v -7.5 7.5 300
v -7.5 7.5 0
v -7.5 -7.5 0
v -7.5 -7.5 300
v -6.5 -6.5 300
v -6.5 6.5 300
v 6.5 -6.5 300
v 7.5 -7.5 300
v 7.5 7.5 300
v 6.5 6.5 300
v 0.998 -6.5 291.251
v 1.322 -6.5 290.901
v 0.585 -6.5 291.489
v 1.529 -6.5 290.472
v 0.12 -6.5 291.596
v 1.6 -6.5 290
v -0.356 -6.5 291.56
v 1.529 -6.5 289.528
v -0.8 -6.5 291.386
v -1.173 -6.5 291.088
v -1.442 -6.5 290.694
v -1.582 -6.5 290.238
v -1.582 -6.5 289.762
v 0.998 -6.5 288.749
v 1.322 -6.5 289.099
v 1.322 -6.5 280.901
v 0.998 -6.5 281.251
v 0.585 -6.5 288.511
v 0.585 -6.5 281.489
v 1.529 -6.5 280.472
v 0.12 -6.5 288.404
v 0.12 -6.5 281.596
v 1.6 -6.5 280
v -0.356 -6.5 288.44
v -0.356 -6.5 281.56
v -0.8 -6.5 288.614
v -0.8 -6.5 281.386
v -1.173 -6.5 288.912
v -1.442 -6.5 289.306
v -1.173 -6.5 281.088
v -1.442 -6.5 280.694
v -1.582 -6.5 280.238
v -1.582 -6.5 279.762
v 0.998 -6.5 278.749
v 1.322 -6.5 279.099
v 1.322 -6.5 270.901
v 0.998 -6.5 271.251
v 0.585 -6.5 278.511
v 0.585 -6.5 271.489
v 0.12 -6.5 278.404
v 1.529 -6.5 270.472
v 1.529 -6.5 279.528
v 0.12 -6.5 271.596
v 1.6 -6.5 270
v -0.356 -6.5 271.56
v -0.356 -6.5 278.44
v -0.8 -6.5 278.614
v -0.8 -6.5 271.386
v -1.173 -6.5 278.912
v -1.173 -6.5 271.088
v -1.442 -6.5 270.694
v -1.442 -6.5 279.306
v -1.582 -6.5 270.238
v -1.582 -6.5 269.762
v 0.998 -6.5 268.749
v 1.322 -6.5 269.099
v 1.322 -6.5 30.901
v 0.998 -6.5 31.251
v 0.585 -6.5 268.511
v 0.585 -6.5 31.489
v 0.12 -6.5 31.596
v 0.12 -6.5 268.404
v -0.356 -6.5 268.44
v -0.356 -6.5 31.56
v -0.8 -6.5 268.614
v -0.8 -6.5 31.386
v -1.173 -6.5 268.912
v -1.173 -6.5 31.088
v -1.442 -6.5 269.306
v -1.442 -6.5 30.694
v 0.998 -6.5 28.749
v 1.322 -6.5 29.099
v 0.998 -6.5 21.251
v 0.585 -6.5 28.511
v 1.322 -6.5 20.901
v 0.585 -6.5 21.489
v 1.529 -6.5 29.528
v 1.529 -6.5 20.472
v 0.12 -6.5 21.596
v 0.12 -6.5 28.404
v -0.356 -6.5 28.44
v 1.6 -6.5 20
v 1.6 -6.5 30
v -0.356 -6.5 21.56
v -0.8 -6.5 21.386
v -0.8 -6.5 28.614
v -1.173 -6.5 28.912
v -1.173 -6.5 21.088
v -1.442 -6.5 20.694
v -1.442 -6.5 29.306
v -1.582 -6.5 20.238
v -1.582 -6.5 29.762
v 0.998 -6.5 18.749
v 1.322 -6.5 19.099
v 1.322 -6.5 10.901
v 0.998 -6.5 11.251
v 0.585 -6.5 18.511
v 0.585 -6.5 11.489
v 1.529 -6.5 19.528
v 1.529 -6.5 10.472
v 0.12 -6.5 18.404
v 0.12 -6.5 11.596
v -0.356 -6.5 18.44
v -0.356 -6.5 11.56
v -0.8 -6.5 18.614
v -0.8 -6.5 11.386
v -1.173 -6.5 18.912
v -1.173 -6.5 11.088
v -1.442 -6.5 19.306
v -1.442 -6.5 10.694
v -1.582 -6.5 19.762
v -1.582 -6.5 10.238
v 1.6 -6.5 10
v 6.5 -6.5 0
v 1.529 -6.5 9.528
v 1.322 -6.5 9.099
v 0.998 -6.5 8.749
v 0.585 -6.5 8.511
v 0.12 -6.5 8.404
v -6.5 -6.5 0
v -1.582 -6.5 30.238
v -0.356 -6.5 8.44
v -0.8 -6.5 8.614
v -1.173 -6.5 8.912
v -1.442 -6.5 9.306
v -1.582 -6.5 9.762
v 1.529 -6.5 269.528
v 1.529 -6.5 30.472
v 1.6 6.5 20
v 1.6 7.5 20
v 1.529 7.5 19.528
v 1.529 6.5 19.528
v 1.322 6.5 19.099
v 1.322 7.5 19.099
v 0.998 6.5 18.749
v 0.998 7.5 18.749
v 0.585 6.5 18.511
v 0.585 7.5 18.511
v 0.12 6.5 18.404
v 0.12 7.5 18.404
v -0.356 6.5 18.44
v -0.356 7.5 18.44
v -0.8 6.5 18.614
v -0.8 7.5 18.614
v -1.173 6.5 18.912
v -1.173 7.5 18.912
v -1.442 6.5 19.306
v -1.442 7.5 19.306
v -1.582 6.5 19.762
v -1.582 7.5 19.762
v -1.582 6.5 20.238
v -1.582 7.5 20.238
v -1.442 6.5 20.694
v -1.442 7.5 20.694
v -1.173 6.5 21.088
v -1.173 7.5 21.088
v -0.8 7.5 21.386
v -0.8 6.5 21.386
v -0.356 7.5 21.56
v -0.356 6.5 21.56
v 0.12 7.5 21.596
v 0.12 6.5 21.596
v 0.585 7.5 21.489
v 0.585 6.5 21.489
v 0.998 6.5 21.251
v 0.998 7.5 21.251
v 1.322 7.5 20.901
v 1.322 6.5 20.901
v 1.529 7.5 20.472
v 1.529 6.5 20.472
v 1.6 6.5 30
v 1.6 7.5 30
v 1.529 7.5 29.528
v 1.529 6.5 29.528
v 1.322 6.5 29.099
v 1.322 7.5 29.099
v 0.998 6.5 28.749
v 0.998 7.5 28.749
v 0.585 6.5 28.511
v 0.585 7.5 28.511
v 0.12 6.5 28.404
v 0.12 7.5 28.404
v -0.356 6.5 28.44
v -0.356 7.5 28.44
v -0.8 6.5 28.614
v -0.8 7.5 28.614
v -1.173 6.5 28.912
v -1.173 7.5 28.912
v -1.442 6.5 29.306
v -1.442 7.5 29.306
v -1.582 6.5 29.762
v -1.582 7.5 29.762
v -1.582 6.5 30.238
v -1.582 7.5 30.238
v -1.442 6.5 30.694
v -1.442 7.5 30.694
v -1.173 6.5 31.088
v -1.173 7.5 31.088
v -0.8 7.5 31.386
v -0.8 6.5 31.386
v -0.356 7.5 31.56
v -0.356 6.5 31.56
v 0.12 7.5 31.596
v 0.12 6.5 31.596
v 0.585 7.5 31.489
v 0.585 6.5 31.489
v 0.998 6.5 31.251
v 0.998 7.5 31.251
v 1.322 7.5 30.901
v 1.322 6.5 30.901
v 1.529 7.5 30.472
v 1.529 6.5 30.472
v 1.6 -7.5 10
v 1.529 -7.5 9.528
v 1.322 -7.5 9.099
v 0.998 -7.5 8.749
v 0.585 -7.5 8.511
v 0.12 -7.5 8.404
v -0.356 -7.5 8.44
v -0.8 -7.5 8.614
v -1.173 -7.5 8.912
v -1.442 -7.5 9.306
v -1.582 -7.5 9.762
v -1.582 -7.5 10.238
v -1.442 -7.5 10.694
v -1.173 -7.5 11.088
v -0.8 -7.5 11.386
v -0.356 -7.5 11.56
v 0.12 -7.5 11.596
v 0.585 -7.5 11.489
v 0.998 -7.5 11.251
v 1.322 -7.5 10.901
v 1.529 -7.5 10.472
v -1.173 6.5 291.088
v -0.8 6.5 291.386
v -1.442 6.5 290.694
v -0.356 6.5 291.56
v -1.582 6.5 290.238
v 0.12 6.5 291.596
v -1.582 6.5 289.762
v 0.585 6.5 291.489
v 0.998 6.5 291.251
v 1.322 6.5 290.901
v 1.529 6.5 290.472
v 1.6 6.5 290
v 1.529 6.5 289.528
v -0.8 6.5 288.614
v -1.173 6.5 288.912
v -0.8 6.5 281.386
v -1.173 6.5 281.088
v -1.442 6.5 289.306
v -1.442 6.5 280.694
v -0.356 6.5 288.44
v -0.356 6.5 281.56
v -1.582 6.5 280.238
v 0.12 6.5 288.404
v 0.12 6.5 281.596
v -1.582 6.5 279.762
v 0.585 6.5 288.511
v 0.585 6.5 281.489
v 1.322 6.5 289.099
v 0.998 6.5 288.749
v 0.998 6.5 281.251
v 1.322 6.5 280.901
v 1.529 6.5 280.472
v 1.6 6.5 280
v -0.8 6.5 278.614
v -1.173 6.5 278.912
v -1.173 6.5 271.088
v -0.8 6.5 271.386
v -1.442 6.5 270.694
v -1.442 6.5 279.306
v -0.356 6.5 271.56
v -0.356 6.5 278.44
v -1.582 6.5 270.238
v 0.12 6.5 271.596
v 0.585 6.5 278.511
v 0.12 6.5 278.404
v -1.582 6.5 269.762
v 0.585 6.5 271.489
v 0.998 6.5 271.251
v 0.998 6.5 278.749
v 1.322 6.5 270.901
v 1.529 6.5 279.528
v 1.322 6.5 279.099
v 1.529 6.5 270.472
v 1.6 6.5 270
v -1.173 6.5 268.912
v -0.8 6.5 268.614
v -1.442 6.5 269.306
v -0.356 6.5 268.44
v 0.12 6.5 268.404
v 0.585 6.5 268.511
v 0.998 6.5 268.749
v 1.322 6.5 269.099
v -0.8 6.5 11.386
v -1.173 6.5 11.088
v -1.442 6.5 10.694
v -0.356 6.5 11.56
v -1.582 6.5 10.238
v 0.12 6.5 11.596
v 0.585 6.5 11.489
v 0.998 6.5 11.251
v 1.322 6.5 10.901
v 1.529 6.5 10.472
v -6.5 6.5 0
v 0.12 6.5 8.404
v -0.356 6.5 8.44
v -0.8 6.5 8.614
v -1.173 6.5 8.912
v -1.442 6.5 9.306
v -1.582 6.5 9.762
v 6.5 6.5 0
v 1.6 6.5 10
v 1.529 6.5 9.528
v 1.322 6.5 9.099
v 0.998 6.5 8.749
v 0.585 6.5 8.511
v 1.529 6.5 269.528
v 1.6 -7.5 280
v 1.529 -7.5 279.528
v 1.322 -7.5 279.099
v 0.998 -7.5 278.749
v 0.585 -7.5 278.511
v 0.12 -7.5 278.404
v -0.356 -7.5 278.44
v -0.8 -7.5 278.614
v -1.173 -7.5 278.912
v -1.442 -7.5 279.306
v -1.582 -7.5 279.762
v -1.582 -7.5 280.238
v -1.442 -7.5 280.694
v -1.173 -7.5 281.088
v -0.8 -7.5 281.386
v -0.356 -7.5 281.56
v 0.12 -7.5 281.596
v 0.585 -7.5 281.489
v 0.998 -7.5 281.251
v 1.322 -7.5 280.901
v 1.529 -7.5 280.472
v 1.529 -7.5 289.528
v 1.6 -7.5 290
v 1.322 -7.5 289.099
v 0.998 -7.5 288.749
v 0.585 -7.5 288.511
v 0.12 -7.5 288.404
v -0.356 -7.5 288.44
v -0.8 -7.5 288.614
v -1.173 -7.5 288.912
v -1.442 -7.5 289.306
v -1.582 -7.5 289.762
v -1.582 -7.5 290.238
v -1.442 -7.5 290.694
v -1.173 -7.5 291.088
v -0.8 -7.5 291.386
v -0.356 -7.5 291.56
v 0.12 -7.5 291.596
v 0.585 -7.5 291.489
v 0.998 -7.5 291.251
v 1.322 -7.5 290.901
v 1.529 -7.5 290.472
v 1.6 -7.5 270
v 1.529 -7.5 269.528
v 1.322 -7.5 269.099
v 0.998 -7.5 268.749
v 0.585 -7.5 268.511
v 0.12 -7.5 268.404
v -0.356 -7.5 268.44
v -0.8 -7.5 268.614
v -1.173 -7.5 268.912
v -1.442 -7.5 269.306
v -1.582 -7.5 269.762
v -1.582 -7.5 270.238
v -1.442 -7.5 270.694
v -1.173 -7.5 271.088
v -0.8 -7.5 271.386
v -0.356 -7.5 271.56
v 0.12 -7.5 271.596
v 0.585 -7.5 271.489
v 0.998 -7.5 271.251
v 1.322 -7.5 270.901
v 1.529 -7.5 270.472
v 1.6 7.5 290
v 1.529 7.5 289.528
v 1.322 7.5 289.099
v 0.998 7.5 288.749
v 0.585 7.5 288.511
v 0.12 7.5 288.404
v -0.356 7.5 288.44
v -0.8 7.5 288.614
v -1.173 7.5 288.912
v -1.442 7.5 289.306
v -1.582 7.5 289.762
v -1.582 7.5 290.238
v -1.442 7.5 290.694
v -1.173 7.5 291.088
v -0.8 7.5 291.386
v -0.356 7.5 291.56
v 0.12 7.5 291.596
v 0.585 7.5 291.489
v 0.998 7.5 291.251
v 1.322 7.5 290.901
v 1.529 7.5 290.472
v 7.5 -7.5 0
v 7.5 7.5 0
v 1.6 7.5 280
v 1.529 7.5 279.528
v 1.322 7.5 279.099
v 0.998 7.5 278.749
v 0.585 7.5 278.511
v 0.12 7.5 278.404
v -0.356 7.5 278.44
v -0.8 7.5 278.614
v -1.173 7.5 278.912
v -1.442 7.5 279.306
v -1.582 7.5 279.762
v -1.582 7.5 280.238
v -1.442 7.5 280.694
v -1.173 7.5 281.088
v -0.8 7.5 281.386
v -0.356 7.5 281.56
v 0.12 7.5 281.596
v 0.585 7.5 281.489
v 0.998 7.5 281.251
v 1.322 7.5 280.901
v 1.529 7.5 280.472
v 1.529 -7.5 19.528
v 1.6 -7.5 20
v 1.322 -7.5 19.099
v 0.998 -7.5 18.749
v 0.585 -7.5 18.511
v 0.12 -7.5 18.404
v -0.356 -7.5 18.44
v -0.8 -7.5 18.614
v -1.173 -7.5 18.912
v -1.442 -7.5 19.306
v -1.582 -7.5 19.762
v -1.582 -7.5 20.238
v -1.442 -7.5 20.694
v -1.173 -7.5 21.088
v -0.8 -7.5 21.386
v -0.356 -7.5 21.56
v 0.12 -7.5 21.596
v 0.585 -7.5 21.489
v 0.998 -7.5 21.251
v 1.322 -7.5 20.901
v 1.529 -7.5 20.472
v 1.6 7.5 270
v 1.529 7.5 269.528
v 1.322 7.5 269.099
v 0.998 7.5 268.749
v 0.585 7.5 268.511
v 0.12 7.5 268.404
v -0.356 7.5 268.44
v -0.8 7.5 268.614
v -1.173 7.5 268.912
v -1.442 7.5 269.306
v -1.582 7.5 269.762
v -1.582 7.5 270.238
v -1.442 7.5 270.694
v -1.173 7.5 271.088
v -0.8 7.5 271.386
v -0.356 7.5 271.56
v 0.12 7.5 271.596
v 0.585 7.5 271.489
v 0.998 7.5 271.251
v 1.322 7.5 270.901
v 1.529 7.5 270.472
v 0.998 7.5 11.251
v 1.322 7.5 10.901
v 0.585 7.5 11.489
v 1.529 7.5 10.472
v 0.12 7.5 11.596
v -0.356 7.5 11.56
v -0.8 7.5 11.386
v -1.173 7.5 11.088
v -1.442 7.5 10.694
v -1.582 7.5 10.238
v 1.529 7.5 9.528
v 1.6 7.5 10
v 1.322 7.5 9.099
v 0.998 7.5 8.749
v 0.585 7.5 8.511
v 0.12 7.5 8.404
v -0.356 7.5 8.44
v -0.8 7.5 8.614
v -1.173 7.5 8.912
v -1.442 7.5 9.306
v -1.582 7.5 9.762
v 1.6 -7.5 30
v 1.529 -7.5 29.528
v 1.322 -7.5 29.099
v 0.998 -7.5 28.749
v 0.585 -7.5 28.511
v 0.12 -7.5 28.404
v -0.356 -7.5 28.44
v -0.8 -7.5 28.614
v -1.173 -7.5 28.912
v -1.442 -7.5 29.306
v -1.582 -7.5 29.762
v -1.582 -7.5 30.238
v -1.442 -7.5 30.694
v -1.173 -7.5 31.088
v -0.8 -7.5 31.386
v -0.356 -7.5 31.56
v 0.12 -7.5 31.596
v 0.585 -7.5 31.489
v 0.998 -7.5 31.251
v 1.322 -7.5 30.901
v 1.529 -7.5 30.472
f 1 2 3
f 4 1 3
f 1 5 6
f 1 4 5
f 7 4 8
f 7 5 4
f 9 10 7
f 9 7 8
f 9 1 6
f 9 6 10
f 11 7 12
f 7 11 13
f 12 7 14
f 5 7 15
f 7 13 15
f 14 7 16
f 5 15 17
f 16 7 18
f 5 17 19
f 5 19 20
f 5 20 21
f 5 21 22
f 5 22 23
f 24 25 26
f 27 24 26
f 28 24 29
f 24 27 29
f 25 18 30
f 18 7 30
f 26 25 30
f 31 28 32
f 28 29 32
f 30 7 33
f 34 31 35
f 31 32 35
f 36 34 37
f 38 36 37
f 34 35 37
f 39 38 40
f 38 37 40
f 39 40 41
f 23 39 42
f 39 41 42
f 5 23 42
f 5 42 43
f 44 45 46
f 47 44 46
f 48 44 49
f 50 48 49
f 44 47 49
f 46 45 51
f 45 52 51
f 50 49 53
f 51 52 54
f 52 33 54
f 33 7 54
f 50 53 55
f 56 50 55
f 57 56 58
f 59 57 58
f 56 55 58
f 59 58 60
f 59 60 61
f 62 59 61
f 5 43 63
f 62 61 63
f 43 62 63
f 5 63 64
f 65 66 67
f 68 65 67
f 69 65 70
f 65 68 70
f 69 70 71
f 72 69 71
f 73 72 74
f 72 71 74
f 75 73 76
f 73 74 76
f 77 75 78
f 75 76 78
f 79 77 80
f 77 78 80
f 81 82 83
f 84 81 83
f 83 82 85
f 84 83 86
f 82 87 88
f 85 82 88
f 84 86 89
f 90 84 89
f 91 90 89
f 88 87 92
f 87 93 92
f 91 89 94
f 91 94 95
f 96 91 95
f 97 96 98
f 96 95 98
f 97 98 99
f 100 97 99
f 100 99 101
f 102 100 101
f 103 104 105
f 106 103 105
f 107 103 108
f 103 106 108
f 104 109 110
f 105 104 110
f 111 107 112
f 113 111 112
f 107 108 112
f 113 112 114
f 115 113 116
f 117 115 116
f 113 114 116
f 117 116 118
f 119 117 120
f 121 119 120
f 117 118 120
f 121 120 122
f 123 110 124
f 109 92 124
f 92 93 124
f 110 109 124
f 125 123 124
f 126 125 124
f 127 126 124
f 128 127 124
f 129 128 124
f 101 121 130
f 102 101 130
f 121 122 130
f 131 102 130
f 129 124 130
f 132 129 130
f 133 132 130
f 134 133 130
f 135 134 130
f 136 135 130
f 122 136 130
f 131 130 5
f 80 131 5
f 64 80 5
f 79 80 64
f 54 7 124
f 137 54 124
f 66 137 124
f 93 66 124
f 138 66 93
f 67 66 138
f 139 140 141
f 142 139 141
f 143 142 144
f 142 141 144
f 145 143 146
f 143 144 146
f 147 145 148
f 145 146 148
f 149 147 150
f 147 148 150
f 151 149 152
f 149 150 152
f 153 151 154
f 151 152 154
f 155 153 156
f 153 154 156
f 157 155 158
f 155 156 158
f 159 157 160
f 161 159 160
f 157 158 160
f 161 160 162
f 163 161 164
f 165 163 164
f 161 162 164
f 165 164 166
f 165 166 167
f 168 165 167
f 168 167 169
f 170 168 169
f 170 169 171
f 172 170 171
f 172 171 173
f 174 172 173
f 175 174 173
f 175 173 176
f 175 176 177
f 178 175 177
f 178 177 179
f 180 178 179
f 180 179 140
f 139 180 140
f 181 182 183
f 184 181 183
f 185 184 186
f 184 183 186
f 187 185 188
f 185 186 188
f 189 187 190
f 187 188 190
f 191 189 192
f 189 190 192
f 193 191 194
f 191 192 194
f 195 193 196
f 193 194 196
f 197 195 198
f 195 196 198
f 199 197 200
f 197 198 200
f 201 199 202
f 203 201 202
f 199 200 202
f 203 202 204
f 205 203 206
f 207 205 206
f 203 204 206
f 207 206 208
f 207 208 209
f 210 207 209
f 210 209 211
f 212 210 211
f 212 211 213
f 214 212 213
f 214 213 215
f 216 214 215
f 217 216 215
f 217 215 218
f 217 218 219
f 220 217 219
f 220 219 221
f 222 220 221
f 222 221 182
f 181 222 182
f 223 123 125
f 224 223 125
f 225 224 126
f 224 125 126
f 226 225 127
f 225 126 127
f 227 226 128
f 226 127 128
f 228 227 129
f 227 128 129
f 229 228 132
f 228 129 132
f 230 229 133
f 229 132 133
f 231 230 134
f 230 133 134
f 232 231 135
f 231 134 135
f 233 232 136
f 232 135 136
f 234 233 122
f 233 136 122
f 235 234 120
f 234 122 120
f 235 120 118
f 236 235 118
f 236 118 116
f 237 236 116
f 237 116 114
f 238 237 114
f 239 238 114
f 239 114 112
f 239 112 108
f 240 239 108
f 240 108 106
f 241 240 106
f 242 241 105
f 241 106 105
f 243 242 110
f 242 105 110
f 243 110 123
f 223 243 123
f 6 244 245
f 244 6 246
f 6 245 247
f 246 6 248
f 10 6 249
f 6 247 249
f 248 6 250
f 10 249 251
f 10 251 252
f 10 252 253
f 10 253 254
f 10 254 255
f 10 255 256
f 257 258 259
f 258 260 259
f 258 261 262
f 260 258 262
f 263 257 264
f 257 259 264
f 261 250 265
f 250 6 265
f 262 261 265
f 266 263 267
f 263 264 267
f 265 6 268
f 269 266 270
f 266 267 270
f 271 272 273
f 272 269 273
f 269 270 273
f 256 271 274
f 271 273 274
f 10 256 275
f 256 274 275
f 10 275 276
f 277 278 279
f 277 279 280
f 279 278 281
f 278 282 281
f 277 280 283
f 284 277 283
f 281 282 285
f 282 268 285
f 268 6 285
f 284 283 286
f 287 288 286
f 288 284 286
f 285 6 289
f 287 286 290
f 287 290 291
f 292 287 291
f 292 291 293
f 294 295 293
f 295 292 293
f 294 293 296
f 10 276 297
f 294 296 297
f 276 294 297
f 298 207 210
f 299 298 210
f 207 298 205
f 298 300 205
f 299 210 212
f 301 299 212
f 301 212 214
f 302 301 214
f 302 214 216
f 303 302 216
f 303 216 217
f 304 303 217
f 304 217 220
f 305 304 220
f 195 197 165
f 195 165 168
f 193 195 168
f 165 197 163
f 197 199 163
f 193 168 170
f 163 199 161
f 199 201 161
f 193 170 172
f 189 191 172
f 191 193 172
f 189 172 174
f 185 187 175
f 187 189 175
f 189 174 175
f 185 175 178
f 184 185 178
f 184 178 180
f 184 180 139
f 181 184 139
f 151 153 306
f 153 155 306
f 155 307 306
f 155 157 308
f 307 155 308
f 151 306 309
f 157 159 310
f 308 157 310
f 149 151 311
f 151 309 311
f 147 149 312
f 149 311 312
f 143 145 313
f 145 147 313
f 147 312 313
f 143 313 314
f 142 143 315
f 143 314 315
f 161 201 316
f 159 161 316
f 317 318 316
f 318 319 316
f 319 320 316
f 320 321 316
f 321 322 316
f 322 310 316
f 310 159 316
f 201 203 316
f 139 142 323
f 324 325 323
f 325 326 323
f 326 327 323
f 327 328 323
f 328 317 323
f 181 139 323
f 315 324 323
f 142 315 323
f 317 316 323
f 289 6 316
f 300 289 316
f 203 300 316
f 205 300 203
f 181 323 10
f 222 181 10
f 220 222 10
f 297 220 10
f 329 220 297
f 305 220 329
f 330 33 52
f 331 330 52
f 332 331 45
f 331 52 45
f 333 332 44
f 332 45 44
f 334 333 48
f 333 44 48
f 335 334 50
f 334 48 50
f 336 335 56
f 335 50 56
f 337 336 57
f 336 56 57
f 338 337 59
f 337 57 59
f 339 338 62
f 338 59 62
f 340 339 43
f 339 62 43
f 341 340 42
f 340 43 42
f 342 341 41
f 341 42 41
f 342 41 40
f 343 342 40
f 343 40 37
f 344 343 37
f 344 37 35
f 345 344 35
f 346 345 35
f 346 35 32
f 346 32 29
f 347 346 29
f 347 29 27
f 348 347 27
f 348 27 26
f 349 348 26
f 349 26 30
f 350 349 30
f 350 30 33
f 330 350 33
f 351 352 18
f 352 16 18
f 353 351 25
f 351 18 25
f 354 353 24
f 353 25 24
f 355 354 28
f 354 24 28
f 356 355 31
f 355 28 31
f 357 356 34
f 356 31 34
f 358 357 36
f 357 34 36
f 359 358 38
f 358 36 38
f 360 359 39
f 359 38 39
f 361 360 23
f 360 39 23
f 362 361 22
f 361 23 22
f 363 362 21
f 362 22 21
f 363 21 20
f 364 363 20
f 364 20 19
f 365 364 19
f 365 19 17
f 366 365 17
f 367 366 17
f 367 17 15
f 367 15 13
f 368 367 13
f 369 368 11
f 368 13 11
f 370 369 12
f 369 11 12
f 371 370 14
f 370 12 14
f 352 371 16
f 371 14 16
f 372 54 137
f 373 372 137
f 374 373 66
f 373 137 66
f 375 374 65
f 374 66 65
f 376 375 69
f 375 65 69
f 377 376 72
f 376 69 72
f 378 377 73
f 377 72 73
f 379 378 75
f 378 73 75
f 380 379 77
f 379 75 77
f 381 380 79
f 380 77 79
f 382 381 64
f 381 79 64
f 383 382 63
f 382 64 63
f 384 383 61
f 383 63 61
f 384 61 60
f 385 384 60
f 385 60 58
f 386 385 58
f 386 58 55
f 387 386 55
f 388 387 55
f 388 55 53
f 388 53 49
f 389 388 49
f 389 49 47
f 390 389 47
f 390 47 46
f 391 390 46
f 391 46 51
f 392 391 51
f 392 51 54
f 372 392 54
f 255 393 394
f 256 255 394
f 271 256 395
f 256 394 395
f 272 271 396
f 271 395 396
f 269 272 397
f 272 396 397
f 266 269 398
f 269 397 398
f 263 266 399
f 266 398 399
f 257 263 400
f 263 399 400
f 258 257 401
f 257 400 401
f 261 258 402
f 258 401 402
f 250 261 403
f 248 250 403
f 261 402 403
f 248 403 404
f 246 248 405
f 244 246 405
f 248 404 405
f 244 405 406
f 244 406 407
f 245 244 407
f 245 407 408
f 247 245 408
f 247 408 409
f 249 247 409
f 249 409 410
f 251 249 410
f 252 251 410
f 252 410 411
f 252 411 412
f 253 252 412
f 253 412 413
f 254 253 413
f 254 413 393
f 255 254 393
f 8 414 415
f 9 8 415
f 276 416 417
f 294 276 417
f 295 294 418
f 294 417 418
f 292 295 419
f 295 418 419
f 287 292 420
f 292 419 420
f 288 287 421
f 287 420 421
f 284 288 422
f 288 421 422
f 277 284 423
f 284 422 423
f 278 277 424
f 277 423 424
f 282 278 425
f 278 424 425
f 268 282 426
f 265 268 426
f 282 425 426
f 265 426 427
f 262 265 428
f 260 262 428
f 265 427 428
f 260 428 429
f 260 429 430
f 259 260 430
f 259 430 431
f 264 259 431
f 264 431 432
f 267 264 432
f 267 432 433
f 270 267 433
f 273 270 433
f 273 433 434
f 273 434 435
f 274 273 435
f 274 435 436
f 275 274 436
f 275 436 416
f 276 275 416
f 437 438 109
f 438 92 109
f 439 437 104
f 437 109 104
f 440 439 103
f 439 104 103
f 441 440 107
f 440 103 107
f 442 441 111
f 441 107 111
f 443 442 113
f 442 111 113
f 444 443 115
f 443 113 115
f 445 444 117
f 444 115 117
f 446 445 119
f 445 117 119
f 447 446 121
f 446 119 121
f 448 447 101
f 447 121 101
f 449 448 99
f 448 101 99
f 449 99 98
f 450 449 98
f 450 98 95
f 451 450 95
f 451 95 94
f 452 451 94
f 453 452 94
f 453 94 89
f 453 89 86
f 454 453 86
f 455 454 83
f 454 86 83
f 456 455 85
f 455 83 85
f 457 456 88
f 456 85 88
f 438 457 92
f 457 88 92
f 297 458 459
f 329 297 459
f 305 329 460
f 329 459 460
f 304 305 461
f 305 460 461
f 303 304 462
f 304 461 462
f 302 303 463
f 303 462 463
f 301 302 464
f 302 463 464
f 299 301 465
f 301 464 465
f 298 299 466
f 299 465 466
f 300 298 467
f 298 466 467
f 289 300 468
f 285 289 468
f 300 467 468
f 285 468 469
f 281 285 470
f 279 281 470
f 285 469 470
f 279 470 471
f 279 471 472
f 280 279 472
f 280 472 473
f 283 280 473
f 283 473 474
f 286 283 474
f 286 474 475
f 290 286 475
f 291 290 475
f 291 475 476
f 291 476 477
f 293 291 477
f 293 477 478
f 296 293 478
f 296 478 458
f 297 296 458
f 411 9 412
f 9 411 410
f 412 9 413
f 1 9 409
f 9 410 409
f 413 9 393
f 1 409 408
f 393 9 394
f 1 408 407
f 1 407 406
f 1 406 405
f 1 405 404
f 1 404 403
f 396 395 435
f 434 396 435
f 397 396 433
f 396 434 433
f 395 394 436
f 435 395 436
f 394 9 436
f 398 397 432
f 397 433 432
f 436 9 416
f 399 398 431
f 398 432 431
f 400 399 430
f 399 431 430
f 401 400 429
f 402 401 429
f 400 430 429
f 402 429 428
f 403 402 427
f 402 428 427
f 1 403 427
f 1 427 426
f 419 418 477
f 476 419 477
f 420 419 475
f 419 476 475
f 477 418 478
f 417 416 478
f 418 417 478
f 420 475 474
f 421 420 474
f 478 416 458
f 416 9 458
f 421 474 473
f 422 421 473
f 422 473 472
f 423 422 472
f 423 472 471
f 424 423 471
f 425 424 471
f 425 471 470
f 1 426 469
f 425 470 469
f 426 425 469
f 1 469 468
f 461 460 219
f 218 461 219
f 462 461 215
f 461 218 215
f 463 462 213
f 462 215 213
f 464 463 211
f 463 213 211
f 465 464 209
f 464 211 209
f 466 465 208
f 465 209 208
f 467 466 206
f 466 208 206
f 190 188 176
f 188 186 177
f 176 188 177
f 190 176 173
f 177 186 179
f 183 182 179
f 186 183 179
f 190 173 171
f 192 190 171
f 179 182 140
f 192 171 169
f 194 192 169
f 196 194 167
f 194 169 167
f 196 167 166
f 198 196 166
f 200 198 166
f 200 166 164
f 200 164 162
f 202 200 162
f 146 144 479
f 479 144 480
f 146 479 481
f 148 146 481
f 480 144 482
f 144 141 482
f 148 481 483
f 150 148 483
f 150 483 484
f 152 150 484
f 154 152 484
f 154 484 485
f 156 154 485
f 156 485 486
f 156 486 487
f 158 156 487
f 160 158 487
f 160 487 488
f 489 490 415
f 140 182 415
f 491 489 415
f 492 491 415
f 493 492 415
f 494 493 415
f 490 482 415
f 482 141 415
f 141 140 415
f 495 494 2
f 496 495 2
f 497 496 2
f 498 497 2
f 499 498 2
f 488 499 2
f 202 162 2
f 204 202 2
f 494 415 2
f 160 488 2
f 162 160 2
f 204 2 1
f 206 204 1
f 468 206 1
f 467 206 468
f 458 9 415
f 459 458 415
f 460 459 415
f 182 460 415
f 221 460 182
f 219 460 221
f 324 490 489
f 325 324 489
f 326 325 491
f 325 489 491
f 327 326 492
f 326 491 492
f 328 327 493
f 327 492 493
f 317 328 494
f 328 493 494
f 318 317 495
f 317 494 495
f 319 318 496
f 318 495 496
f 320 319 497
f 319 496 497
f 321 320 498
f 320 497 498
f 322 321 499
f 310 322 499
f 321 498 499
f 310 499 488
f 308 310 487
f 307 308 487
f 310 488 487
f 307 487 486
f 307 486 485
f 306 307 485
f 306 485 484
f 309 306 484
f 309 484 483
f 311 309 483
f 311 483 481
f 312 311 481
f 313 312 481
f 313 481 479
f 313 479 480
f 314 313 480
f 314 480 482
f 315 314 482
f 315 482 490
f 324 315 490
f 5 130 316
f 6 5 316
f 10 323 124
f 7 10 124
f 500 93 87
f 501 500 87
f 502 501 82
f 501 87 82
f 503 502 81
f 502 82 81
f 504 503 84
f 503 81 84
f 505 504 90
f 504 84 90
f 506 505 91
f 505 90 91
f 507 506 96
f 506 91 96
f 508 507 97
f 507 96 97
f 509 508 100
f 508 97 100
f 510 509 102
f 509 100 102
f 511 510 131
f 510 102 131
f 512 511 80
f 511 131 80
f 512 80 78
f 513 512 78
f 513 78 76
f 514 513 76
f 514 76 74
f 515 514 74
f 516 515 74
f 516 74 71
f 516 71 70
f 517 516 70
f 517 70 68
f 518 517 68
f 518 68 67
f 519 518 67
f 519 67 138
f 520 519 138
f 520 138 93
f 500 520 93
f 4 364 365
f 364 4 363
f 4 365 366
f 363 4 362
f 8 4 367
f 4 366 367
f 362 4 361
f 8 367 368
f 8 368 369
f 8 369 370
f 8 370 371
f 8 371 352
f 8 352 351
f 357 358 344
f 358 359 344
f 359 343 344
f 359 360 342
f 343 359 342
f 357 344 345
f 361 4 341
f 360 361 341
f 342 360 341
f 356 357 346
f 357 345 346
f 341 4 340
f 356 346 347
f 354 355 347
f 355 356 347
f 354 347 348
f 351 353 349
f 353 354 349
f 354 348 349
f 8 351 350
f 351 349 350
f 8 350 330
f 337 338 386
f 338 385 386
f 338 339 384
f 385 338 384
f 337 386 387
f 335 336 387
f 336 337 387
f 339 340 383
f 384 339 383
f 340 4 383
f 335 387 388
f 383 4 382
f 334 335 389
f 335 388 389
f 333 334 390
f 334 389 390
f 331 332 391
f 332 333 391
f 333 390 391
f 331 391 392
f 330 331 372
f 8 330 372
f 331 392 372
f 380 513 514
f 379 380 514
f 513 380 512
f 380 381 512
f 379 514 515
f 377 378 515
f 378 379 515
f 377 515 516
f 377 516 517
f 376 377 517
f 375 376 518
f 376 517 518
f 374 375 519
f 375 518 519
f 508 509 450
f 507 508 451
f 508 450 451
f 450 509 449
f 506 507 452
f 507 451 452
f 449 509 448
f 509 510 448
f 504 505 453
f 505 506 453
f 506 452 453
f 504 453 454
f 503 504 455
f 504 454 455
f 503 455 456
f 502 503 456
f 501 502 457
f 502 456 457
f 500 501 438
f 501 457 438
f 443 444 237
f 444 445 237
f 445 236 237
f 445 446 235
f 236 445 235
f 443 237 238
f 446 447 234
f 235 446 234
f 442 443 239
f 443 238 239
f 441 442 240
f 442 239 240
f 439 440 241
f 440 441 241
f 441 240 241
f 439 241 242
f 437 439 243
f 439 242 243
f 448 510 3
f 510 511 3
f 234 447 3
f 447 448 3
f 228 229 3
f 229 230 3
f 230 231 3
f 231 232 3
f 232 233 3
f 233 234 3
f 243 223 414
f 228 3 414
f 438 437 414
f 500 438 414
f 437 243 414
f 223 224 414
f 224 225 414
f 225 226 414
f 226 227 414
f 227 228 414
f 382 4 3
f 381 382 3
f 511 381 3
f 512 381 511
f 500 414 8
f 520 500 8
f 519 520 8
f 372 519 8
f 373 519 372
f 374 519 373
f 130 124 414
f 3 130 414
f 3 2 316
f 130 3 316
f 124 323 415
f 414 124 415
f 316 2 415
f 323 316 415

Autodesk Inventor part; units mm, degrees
ref_plane "YZ Plane" through (0, 0, 0) normal (1, 0, 0) x (0, 1, 0)
ref_plane "XZ Plane" through (0, 0, 0) normal (0, 1, 0) x (-1, 0, 0)
ref_plane "XY Plane" through (0, 0, 0) normal (0, 0, 1) x (1, 0, 0)
sketch "スケッチ1" plane through (0, 0, 0) normal (0, 0, 1) x (1, 0, 0)
  line L0 (7.5, 7.5) -> (-7.5, 7.5)
  line L1 (-7.5, 7.5) -> (-7.5, -7.5)
  line L2 (-7.5, -7.5) -> (7.5, -7.5)
  line L3 (7.5, -7.5) -> (7.5, 7.5)
  line L4 (7.5, 7.5) -> (-7.5, -7.5) construction
  line L5 (-7.5, 7.5) -> (7.5, -7.5) construction
  line L6 (-6.5, 6.5) -> (6.5, 6.5)
  line L7 (6.5, 6.5) -> (6.5, -6.5)
  line L8 (6.5, -6.5) -> (-6.5, -6.5)
  line L9 (-6.5, -6.5) -> (-6.5, 6.5)
  point P0 (0, 0)
  dimension "d0" = 15
  dimension "d1" = 15
  dimension "d2" = 1
extrude "押し出し1" add sketch "スケッチ1" along normal blind 300
sketch "スケッチ2" plane through (-7.5, 7.5, 0) normal (0, 1, 0) x (1, 0, 0)
  circle A0 centre (7.5, -10) radius 1.6
  circle A1 centre (7.5, -20) radius 1.6
  circle A2 centre (7.5, -30) radius 1.6
  circle A3 centre (7.5, -290) radius 1.6
  circle A4 centre (7.5, -280) radius 1.6
  circle A5 centre (7.5, -270) radius 1.6
  line L0 (15, -300) -> (0, -300) projected
  line L1 (15, 0) -> (0, 0) projected
  point P0 (7.5, 0)
  point P1 (7.5, 0)
  dimension "d5" = 3.2
  dimension "d6" = 3.2
  dimension "d7" = 3.2
  dimension "d8" = 3.2
  dimension "d9" = 3.2
  dimension "d10" = 3.2
  dimension "d11" = 10
  dimension "d12" = 10
  dimension "d13" = 10
  dimension "d14" = 10
  dimension "d15" = 10
  dimension "d16" = 10
extrude "押し出し2" cut sketch "スケッチ2" against normal through all
properties part number "オムニ_角柱9" material "アルミニウム 6061"
